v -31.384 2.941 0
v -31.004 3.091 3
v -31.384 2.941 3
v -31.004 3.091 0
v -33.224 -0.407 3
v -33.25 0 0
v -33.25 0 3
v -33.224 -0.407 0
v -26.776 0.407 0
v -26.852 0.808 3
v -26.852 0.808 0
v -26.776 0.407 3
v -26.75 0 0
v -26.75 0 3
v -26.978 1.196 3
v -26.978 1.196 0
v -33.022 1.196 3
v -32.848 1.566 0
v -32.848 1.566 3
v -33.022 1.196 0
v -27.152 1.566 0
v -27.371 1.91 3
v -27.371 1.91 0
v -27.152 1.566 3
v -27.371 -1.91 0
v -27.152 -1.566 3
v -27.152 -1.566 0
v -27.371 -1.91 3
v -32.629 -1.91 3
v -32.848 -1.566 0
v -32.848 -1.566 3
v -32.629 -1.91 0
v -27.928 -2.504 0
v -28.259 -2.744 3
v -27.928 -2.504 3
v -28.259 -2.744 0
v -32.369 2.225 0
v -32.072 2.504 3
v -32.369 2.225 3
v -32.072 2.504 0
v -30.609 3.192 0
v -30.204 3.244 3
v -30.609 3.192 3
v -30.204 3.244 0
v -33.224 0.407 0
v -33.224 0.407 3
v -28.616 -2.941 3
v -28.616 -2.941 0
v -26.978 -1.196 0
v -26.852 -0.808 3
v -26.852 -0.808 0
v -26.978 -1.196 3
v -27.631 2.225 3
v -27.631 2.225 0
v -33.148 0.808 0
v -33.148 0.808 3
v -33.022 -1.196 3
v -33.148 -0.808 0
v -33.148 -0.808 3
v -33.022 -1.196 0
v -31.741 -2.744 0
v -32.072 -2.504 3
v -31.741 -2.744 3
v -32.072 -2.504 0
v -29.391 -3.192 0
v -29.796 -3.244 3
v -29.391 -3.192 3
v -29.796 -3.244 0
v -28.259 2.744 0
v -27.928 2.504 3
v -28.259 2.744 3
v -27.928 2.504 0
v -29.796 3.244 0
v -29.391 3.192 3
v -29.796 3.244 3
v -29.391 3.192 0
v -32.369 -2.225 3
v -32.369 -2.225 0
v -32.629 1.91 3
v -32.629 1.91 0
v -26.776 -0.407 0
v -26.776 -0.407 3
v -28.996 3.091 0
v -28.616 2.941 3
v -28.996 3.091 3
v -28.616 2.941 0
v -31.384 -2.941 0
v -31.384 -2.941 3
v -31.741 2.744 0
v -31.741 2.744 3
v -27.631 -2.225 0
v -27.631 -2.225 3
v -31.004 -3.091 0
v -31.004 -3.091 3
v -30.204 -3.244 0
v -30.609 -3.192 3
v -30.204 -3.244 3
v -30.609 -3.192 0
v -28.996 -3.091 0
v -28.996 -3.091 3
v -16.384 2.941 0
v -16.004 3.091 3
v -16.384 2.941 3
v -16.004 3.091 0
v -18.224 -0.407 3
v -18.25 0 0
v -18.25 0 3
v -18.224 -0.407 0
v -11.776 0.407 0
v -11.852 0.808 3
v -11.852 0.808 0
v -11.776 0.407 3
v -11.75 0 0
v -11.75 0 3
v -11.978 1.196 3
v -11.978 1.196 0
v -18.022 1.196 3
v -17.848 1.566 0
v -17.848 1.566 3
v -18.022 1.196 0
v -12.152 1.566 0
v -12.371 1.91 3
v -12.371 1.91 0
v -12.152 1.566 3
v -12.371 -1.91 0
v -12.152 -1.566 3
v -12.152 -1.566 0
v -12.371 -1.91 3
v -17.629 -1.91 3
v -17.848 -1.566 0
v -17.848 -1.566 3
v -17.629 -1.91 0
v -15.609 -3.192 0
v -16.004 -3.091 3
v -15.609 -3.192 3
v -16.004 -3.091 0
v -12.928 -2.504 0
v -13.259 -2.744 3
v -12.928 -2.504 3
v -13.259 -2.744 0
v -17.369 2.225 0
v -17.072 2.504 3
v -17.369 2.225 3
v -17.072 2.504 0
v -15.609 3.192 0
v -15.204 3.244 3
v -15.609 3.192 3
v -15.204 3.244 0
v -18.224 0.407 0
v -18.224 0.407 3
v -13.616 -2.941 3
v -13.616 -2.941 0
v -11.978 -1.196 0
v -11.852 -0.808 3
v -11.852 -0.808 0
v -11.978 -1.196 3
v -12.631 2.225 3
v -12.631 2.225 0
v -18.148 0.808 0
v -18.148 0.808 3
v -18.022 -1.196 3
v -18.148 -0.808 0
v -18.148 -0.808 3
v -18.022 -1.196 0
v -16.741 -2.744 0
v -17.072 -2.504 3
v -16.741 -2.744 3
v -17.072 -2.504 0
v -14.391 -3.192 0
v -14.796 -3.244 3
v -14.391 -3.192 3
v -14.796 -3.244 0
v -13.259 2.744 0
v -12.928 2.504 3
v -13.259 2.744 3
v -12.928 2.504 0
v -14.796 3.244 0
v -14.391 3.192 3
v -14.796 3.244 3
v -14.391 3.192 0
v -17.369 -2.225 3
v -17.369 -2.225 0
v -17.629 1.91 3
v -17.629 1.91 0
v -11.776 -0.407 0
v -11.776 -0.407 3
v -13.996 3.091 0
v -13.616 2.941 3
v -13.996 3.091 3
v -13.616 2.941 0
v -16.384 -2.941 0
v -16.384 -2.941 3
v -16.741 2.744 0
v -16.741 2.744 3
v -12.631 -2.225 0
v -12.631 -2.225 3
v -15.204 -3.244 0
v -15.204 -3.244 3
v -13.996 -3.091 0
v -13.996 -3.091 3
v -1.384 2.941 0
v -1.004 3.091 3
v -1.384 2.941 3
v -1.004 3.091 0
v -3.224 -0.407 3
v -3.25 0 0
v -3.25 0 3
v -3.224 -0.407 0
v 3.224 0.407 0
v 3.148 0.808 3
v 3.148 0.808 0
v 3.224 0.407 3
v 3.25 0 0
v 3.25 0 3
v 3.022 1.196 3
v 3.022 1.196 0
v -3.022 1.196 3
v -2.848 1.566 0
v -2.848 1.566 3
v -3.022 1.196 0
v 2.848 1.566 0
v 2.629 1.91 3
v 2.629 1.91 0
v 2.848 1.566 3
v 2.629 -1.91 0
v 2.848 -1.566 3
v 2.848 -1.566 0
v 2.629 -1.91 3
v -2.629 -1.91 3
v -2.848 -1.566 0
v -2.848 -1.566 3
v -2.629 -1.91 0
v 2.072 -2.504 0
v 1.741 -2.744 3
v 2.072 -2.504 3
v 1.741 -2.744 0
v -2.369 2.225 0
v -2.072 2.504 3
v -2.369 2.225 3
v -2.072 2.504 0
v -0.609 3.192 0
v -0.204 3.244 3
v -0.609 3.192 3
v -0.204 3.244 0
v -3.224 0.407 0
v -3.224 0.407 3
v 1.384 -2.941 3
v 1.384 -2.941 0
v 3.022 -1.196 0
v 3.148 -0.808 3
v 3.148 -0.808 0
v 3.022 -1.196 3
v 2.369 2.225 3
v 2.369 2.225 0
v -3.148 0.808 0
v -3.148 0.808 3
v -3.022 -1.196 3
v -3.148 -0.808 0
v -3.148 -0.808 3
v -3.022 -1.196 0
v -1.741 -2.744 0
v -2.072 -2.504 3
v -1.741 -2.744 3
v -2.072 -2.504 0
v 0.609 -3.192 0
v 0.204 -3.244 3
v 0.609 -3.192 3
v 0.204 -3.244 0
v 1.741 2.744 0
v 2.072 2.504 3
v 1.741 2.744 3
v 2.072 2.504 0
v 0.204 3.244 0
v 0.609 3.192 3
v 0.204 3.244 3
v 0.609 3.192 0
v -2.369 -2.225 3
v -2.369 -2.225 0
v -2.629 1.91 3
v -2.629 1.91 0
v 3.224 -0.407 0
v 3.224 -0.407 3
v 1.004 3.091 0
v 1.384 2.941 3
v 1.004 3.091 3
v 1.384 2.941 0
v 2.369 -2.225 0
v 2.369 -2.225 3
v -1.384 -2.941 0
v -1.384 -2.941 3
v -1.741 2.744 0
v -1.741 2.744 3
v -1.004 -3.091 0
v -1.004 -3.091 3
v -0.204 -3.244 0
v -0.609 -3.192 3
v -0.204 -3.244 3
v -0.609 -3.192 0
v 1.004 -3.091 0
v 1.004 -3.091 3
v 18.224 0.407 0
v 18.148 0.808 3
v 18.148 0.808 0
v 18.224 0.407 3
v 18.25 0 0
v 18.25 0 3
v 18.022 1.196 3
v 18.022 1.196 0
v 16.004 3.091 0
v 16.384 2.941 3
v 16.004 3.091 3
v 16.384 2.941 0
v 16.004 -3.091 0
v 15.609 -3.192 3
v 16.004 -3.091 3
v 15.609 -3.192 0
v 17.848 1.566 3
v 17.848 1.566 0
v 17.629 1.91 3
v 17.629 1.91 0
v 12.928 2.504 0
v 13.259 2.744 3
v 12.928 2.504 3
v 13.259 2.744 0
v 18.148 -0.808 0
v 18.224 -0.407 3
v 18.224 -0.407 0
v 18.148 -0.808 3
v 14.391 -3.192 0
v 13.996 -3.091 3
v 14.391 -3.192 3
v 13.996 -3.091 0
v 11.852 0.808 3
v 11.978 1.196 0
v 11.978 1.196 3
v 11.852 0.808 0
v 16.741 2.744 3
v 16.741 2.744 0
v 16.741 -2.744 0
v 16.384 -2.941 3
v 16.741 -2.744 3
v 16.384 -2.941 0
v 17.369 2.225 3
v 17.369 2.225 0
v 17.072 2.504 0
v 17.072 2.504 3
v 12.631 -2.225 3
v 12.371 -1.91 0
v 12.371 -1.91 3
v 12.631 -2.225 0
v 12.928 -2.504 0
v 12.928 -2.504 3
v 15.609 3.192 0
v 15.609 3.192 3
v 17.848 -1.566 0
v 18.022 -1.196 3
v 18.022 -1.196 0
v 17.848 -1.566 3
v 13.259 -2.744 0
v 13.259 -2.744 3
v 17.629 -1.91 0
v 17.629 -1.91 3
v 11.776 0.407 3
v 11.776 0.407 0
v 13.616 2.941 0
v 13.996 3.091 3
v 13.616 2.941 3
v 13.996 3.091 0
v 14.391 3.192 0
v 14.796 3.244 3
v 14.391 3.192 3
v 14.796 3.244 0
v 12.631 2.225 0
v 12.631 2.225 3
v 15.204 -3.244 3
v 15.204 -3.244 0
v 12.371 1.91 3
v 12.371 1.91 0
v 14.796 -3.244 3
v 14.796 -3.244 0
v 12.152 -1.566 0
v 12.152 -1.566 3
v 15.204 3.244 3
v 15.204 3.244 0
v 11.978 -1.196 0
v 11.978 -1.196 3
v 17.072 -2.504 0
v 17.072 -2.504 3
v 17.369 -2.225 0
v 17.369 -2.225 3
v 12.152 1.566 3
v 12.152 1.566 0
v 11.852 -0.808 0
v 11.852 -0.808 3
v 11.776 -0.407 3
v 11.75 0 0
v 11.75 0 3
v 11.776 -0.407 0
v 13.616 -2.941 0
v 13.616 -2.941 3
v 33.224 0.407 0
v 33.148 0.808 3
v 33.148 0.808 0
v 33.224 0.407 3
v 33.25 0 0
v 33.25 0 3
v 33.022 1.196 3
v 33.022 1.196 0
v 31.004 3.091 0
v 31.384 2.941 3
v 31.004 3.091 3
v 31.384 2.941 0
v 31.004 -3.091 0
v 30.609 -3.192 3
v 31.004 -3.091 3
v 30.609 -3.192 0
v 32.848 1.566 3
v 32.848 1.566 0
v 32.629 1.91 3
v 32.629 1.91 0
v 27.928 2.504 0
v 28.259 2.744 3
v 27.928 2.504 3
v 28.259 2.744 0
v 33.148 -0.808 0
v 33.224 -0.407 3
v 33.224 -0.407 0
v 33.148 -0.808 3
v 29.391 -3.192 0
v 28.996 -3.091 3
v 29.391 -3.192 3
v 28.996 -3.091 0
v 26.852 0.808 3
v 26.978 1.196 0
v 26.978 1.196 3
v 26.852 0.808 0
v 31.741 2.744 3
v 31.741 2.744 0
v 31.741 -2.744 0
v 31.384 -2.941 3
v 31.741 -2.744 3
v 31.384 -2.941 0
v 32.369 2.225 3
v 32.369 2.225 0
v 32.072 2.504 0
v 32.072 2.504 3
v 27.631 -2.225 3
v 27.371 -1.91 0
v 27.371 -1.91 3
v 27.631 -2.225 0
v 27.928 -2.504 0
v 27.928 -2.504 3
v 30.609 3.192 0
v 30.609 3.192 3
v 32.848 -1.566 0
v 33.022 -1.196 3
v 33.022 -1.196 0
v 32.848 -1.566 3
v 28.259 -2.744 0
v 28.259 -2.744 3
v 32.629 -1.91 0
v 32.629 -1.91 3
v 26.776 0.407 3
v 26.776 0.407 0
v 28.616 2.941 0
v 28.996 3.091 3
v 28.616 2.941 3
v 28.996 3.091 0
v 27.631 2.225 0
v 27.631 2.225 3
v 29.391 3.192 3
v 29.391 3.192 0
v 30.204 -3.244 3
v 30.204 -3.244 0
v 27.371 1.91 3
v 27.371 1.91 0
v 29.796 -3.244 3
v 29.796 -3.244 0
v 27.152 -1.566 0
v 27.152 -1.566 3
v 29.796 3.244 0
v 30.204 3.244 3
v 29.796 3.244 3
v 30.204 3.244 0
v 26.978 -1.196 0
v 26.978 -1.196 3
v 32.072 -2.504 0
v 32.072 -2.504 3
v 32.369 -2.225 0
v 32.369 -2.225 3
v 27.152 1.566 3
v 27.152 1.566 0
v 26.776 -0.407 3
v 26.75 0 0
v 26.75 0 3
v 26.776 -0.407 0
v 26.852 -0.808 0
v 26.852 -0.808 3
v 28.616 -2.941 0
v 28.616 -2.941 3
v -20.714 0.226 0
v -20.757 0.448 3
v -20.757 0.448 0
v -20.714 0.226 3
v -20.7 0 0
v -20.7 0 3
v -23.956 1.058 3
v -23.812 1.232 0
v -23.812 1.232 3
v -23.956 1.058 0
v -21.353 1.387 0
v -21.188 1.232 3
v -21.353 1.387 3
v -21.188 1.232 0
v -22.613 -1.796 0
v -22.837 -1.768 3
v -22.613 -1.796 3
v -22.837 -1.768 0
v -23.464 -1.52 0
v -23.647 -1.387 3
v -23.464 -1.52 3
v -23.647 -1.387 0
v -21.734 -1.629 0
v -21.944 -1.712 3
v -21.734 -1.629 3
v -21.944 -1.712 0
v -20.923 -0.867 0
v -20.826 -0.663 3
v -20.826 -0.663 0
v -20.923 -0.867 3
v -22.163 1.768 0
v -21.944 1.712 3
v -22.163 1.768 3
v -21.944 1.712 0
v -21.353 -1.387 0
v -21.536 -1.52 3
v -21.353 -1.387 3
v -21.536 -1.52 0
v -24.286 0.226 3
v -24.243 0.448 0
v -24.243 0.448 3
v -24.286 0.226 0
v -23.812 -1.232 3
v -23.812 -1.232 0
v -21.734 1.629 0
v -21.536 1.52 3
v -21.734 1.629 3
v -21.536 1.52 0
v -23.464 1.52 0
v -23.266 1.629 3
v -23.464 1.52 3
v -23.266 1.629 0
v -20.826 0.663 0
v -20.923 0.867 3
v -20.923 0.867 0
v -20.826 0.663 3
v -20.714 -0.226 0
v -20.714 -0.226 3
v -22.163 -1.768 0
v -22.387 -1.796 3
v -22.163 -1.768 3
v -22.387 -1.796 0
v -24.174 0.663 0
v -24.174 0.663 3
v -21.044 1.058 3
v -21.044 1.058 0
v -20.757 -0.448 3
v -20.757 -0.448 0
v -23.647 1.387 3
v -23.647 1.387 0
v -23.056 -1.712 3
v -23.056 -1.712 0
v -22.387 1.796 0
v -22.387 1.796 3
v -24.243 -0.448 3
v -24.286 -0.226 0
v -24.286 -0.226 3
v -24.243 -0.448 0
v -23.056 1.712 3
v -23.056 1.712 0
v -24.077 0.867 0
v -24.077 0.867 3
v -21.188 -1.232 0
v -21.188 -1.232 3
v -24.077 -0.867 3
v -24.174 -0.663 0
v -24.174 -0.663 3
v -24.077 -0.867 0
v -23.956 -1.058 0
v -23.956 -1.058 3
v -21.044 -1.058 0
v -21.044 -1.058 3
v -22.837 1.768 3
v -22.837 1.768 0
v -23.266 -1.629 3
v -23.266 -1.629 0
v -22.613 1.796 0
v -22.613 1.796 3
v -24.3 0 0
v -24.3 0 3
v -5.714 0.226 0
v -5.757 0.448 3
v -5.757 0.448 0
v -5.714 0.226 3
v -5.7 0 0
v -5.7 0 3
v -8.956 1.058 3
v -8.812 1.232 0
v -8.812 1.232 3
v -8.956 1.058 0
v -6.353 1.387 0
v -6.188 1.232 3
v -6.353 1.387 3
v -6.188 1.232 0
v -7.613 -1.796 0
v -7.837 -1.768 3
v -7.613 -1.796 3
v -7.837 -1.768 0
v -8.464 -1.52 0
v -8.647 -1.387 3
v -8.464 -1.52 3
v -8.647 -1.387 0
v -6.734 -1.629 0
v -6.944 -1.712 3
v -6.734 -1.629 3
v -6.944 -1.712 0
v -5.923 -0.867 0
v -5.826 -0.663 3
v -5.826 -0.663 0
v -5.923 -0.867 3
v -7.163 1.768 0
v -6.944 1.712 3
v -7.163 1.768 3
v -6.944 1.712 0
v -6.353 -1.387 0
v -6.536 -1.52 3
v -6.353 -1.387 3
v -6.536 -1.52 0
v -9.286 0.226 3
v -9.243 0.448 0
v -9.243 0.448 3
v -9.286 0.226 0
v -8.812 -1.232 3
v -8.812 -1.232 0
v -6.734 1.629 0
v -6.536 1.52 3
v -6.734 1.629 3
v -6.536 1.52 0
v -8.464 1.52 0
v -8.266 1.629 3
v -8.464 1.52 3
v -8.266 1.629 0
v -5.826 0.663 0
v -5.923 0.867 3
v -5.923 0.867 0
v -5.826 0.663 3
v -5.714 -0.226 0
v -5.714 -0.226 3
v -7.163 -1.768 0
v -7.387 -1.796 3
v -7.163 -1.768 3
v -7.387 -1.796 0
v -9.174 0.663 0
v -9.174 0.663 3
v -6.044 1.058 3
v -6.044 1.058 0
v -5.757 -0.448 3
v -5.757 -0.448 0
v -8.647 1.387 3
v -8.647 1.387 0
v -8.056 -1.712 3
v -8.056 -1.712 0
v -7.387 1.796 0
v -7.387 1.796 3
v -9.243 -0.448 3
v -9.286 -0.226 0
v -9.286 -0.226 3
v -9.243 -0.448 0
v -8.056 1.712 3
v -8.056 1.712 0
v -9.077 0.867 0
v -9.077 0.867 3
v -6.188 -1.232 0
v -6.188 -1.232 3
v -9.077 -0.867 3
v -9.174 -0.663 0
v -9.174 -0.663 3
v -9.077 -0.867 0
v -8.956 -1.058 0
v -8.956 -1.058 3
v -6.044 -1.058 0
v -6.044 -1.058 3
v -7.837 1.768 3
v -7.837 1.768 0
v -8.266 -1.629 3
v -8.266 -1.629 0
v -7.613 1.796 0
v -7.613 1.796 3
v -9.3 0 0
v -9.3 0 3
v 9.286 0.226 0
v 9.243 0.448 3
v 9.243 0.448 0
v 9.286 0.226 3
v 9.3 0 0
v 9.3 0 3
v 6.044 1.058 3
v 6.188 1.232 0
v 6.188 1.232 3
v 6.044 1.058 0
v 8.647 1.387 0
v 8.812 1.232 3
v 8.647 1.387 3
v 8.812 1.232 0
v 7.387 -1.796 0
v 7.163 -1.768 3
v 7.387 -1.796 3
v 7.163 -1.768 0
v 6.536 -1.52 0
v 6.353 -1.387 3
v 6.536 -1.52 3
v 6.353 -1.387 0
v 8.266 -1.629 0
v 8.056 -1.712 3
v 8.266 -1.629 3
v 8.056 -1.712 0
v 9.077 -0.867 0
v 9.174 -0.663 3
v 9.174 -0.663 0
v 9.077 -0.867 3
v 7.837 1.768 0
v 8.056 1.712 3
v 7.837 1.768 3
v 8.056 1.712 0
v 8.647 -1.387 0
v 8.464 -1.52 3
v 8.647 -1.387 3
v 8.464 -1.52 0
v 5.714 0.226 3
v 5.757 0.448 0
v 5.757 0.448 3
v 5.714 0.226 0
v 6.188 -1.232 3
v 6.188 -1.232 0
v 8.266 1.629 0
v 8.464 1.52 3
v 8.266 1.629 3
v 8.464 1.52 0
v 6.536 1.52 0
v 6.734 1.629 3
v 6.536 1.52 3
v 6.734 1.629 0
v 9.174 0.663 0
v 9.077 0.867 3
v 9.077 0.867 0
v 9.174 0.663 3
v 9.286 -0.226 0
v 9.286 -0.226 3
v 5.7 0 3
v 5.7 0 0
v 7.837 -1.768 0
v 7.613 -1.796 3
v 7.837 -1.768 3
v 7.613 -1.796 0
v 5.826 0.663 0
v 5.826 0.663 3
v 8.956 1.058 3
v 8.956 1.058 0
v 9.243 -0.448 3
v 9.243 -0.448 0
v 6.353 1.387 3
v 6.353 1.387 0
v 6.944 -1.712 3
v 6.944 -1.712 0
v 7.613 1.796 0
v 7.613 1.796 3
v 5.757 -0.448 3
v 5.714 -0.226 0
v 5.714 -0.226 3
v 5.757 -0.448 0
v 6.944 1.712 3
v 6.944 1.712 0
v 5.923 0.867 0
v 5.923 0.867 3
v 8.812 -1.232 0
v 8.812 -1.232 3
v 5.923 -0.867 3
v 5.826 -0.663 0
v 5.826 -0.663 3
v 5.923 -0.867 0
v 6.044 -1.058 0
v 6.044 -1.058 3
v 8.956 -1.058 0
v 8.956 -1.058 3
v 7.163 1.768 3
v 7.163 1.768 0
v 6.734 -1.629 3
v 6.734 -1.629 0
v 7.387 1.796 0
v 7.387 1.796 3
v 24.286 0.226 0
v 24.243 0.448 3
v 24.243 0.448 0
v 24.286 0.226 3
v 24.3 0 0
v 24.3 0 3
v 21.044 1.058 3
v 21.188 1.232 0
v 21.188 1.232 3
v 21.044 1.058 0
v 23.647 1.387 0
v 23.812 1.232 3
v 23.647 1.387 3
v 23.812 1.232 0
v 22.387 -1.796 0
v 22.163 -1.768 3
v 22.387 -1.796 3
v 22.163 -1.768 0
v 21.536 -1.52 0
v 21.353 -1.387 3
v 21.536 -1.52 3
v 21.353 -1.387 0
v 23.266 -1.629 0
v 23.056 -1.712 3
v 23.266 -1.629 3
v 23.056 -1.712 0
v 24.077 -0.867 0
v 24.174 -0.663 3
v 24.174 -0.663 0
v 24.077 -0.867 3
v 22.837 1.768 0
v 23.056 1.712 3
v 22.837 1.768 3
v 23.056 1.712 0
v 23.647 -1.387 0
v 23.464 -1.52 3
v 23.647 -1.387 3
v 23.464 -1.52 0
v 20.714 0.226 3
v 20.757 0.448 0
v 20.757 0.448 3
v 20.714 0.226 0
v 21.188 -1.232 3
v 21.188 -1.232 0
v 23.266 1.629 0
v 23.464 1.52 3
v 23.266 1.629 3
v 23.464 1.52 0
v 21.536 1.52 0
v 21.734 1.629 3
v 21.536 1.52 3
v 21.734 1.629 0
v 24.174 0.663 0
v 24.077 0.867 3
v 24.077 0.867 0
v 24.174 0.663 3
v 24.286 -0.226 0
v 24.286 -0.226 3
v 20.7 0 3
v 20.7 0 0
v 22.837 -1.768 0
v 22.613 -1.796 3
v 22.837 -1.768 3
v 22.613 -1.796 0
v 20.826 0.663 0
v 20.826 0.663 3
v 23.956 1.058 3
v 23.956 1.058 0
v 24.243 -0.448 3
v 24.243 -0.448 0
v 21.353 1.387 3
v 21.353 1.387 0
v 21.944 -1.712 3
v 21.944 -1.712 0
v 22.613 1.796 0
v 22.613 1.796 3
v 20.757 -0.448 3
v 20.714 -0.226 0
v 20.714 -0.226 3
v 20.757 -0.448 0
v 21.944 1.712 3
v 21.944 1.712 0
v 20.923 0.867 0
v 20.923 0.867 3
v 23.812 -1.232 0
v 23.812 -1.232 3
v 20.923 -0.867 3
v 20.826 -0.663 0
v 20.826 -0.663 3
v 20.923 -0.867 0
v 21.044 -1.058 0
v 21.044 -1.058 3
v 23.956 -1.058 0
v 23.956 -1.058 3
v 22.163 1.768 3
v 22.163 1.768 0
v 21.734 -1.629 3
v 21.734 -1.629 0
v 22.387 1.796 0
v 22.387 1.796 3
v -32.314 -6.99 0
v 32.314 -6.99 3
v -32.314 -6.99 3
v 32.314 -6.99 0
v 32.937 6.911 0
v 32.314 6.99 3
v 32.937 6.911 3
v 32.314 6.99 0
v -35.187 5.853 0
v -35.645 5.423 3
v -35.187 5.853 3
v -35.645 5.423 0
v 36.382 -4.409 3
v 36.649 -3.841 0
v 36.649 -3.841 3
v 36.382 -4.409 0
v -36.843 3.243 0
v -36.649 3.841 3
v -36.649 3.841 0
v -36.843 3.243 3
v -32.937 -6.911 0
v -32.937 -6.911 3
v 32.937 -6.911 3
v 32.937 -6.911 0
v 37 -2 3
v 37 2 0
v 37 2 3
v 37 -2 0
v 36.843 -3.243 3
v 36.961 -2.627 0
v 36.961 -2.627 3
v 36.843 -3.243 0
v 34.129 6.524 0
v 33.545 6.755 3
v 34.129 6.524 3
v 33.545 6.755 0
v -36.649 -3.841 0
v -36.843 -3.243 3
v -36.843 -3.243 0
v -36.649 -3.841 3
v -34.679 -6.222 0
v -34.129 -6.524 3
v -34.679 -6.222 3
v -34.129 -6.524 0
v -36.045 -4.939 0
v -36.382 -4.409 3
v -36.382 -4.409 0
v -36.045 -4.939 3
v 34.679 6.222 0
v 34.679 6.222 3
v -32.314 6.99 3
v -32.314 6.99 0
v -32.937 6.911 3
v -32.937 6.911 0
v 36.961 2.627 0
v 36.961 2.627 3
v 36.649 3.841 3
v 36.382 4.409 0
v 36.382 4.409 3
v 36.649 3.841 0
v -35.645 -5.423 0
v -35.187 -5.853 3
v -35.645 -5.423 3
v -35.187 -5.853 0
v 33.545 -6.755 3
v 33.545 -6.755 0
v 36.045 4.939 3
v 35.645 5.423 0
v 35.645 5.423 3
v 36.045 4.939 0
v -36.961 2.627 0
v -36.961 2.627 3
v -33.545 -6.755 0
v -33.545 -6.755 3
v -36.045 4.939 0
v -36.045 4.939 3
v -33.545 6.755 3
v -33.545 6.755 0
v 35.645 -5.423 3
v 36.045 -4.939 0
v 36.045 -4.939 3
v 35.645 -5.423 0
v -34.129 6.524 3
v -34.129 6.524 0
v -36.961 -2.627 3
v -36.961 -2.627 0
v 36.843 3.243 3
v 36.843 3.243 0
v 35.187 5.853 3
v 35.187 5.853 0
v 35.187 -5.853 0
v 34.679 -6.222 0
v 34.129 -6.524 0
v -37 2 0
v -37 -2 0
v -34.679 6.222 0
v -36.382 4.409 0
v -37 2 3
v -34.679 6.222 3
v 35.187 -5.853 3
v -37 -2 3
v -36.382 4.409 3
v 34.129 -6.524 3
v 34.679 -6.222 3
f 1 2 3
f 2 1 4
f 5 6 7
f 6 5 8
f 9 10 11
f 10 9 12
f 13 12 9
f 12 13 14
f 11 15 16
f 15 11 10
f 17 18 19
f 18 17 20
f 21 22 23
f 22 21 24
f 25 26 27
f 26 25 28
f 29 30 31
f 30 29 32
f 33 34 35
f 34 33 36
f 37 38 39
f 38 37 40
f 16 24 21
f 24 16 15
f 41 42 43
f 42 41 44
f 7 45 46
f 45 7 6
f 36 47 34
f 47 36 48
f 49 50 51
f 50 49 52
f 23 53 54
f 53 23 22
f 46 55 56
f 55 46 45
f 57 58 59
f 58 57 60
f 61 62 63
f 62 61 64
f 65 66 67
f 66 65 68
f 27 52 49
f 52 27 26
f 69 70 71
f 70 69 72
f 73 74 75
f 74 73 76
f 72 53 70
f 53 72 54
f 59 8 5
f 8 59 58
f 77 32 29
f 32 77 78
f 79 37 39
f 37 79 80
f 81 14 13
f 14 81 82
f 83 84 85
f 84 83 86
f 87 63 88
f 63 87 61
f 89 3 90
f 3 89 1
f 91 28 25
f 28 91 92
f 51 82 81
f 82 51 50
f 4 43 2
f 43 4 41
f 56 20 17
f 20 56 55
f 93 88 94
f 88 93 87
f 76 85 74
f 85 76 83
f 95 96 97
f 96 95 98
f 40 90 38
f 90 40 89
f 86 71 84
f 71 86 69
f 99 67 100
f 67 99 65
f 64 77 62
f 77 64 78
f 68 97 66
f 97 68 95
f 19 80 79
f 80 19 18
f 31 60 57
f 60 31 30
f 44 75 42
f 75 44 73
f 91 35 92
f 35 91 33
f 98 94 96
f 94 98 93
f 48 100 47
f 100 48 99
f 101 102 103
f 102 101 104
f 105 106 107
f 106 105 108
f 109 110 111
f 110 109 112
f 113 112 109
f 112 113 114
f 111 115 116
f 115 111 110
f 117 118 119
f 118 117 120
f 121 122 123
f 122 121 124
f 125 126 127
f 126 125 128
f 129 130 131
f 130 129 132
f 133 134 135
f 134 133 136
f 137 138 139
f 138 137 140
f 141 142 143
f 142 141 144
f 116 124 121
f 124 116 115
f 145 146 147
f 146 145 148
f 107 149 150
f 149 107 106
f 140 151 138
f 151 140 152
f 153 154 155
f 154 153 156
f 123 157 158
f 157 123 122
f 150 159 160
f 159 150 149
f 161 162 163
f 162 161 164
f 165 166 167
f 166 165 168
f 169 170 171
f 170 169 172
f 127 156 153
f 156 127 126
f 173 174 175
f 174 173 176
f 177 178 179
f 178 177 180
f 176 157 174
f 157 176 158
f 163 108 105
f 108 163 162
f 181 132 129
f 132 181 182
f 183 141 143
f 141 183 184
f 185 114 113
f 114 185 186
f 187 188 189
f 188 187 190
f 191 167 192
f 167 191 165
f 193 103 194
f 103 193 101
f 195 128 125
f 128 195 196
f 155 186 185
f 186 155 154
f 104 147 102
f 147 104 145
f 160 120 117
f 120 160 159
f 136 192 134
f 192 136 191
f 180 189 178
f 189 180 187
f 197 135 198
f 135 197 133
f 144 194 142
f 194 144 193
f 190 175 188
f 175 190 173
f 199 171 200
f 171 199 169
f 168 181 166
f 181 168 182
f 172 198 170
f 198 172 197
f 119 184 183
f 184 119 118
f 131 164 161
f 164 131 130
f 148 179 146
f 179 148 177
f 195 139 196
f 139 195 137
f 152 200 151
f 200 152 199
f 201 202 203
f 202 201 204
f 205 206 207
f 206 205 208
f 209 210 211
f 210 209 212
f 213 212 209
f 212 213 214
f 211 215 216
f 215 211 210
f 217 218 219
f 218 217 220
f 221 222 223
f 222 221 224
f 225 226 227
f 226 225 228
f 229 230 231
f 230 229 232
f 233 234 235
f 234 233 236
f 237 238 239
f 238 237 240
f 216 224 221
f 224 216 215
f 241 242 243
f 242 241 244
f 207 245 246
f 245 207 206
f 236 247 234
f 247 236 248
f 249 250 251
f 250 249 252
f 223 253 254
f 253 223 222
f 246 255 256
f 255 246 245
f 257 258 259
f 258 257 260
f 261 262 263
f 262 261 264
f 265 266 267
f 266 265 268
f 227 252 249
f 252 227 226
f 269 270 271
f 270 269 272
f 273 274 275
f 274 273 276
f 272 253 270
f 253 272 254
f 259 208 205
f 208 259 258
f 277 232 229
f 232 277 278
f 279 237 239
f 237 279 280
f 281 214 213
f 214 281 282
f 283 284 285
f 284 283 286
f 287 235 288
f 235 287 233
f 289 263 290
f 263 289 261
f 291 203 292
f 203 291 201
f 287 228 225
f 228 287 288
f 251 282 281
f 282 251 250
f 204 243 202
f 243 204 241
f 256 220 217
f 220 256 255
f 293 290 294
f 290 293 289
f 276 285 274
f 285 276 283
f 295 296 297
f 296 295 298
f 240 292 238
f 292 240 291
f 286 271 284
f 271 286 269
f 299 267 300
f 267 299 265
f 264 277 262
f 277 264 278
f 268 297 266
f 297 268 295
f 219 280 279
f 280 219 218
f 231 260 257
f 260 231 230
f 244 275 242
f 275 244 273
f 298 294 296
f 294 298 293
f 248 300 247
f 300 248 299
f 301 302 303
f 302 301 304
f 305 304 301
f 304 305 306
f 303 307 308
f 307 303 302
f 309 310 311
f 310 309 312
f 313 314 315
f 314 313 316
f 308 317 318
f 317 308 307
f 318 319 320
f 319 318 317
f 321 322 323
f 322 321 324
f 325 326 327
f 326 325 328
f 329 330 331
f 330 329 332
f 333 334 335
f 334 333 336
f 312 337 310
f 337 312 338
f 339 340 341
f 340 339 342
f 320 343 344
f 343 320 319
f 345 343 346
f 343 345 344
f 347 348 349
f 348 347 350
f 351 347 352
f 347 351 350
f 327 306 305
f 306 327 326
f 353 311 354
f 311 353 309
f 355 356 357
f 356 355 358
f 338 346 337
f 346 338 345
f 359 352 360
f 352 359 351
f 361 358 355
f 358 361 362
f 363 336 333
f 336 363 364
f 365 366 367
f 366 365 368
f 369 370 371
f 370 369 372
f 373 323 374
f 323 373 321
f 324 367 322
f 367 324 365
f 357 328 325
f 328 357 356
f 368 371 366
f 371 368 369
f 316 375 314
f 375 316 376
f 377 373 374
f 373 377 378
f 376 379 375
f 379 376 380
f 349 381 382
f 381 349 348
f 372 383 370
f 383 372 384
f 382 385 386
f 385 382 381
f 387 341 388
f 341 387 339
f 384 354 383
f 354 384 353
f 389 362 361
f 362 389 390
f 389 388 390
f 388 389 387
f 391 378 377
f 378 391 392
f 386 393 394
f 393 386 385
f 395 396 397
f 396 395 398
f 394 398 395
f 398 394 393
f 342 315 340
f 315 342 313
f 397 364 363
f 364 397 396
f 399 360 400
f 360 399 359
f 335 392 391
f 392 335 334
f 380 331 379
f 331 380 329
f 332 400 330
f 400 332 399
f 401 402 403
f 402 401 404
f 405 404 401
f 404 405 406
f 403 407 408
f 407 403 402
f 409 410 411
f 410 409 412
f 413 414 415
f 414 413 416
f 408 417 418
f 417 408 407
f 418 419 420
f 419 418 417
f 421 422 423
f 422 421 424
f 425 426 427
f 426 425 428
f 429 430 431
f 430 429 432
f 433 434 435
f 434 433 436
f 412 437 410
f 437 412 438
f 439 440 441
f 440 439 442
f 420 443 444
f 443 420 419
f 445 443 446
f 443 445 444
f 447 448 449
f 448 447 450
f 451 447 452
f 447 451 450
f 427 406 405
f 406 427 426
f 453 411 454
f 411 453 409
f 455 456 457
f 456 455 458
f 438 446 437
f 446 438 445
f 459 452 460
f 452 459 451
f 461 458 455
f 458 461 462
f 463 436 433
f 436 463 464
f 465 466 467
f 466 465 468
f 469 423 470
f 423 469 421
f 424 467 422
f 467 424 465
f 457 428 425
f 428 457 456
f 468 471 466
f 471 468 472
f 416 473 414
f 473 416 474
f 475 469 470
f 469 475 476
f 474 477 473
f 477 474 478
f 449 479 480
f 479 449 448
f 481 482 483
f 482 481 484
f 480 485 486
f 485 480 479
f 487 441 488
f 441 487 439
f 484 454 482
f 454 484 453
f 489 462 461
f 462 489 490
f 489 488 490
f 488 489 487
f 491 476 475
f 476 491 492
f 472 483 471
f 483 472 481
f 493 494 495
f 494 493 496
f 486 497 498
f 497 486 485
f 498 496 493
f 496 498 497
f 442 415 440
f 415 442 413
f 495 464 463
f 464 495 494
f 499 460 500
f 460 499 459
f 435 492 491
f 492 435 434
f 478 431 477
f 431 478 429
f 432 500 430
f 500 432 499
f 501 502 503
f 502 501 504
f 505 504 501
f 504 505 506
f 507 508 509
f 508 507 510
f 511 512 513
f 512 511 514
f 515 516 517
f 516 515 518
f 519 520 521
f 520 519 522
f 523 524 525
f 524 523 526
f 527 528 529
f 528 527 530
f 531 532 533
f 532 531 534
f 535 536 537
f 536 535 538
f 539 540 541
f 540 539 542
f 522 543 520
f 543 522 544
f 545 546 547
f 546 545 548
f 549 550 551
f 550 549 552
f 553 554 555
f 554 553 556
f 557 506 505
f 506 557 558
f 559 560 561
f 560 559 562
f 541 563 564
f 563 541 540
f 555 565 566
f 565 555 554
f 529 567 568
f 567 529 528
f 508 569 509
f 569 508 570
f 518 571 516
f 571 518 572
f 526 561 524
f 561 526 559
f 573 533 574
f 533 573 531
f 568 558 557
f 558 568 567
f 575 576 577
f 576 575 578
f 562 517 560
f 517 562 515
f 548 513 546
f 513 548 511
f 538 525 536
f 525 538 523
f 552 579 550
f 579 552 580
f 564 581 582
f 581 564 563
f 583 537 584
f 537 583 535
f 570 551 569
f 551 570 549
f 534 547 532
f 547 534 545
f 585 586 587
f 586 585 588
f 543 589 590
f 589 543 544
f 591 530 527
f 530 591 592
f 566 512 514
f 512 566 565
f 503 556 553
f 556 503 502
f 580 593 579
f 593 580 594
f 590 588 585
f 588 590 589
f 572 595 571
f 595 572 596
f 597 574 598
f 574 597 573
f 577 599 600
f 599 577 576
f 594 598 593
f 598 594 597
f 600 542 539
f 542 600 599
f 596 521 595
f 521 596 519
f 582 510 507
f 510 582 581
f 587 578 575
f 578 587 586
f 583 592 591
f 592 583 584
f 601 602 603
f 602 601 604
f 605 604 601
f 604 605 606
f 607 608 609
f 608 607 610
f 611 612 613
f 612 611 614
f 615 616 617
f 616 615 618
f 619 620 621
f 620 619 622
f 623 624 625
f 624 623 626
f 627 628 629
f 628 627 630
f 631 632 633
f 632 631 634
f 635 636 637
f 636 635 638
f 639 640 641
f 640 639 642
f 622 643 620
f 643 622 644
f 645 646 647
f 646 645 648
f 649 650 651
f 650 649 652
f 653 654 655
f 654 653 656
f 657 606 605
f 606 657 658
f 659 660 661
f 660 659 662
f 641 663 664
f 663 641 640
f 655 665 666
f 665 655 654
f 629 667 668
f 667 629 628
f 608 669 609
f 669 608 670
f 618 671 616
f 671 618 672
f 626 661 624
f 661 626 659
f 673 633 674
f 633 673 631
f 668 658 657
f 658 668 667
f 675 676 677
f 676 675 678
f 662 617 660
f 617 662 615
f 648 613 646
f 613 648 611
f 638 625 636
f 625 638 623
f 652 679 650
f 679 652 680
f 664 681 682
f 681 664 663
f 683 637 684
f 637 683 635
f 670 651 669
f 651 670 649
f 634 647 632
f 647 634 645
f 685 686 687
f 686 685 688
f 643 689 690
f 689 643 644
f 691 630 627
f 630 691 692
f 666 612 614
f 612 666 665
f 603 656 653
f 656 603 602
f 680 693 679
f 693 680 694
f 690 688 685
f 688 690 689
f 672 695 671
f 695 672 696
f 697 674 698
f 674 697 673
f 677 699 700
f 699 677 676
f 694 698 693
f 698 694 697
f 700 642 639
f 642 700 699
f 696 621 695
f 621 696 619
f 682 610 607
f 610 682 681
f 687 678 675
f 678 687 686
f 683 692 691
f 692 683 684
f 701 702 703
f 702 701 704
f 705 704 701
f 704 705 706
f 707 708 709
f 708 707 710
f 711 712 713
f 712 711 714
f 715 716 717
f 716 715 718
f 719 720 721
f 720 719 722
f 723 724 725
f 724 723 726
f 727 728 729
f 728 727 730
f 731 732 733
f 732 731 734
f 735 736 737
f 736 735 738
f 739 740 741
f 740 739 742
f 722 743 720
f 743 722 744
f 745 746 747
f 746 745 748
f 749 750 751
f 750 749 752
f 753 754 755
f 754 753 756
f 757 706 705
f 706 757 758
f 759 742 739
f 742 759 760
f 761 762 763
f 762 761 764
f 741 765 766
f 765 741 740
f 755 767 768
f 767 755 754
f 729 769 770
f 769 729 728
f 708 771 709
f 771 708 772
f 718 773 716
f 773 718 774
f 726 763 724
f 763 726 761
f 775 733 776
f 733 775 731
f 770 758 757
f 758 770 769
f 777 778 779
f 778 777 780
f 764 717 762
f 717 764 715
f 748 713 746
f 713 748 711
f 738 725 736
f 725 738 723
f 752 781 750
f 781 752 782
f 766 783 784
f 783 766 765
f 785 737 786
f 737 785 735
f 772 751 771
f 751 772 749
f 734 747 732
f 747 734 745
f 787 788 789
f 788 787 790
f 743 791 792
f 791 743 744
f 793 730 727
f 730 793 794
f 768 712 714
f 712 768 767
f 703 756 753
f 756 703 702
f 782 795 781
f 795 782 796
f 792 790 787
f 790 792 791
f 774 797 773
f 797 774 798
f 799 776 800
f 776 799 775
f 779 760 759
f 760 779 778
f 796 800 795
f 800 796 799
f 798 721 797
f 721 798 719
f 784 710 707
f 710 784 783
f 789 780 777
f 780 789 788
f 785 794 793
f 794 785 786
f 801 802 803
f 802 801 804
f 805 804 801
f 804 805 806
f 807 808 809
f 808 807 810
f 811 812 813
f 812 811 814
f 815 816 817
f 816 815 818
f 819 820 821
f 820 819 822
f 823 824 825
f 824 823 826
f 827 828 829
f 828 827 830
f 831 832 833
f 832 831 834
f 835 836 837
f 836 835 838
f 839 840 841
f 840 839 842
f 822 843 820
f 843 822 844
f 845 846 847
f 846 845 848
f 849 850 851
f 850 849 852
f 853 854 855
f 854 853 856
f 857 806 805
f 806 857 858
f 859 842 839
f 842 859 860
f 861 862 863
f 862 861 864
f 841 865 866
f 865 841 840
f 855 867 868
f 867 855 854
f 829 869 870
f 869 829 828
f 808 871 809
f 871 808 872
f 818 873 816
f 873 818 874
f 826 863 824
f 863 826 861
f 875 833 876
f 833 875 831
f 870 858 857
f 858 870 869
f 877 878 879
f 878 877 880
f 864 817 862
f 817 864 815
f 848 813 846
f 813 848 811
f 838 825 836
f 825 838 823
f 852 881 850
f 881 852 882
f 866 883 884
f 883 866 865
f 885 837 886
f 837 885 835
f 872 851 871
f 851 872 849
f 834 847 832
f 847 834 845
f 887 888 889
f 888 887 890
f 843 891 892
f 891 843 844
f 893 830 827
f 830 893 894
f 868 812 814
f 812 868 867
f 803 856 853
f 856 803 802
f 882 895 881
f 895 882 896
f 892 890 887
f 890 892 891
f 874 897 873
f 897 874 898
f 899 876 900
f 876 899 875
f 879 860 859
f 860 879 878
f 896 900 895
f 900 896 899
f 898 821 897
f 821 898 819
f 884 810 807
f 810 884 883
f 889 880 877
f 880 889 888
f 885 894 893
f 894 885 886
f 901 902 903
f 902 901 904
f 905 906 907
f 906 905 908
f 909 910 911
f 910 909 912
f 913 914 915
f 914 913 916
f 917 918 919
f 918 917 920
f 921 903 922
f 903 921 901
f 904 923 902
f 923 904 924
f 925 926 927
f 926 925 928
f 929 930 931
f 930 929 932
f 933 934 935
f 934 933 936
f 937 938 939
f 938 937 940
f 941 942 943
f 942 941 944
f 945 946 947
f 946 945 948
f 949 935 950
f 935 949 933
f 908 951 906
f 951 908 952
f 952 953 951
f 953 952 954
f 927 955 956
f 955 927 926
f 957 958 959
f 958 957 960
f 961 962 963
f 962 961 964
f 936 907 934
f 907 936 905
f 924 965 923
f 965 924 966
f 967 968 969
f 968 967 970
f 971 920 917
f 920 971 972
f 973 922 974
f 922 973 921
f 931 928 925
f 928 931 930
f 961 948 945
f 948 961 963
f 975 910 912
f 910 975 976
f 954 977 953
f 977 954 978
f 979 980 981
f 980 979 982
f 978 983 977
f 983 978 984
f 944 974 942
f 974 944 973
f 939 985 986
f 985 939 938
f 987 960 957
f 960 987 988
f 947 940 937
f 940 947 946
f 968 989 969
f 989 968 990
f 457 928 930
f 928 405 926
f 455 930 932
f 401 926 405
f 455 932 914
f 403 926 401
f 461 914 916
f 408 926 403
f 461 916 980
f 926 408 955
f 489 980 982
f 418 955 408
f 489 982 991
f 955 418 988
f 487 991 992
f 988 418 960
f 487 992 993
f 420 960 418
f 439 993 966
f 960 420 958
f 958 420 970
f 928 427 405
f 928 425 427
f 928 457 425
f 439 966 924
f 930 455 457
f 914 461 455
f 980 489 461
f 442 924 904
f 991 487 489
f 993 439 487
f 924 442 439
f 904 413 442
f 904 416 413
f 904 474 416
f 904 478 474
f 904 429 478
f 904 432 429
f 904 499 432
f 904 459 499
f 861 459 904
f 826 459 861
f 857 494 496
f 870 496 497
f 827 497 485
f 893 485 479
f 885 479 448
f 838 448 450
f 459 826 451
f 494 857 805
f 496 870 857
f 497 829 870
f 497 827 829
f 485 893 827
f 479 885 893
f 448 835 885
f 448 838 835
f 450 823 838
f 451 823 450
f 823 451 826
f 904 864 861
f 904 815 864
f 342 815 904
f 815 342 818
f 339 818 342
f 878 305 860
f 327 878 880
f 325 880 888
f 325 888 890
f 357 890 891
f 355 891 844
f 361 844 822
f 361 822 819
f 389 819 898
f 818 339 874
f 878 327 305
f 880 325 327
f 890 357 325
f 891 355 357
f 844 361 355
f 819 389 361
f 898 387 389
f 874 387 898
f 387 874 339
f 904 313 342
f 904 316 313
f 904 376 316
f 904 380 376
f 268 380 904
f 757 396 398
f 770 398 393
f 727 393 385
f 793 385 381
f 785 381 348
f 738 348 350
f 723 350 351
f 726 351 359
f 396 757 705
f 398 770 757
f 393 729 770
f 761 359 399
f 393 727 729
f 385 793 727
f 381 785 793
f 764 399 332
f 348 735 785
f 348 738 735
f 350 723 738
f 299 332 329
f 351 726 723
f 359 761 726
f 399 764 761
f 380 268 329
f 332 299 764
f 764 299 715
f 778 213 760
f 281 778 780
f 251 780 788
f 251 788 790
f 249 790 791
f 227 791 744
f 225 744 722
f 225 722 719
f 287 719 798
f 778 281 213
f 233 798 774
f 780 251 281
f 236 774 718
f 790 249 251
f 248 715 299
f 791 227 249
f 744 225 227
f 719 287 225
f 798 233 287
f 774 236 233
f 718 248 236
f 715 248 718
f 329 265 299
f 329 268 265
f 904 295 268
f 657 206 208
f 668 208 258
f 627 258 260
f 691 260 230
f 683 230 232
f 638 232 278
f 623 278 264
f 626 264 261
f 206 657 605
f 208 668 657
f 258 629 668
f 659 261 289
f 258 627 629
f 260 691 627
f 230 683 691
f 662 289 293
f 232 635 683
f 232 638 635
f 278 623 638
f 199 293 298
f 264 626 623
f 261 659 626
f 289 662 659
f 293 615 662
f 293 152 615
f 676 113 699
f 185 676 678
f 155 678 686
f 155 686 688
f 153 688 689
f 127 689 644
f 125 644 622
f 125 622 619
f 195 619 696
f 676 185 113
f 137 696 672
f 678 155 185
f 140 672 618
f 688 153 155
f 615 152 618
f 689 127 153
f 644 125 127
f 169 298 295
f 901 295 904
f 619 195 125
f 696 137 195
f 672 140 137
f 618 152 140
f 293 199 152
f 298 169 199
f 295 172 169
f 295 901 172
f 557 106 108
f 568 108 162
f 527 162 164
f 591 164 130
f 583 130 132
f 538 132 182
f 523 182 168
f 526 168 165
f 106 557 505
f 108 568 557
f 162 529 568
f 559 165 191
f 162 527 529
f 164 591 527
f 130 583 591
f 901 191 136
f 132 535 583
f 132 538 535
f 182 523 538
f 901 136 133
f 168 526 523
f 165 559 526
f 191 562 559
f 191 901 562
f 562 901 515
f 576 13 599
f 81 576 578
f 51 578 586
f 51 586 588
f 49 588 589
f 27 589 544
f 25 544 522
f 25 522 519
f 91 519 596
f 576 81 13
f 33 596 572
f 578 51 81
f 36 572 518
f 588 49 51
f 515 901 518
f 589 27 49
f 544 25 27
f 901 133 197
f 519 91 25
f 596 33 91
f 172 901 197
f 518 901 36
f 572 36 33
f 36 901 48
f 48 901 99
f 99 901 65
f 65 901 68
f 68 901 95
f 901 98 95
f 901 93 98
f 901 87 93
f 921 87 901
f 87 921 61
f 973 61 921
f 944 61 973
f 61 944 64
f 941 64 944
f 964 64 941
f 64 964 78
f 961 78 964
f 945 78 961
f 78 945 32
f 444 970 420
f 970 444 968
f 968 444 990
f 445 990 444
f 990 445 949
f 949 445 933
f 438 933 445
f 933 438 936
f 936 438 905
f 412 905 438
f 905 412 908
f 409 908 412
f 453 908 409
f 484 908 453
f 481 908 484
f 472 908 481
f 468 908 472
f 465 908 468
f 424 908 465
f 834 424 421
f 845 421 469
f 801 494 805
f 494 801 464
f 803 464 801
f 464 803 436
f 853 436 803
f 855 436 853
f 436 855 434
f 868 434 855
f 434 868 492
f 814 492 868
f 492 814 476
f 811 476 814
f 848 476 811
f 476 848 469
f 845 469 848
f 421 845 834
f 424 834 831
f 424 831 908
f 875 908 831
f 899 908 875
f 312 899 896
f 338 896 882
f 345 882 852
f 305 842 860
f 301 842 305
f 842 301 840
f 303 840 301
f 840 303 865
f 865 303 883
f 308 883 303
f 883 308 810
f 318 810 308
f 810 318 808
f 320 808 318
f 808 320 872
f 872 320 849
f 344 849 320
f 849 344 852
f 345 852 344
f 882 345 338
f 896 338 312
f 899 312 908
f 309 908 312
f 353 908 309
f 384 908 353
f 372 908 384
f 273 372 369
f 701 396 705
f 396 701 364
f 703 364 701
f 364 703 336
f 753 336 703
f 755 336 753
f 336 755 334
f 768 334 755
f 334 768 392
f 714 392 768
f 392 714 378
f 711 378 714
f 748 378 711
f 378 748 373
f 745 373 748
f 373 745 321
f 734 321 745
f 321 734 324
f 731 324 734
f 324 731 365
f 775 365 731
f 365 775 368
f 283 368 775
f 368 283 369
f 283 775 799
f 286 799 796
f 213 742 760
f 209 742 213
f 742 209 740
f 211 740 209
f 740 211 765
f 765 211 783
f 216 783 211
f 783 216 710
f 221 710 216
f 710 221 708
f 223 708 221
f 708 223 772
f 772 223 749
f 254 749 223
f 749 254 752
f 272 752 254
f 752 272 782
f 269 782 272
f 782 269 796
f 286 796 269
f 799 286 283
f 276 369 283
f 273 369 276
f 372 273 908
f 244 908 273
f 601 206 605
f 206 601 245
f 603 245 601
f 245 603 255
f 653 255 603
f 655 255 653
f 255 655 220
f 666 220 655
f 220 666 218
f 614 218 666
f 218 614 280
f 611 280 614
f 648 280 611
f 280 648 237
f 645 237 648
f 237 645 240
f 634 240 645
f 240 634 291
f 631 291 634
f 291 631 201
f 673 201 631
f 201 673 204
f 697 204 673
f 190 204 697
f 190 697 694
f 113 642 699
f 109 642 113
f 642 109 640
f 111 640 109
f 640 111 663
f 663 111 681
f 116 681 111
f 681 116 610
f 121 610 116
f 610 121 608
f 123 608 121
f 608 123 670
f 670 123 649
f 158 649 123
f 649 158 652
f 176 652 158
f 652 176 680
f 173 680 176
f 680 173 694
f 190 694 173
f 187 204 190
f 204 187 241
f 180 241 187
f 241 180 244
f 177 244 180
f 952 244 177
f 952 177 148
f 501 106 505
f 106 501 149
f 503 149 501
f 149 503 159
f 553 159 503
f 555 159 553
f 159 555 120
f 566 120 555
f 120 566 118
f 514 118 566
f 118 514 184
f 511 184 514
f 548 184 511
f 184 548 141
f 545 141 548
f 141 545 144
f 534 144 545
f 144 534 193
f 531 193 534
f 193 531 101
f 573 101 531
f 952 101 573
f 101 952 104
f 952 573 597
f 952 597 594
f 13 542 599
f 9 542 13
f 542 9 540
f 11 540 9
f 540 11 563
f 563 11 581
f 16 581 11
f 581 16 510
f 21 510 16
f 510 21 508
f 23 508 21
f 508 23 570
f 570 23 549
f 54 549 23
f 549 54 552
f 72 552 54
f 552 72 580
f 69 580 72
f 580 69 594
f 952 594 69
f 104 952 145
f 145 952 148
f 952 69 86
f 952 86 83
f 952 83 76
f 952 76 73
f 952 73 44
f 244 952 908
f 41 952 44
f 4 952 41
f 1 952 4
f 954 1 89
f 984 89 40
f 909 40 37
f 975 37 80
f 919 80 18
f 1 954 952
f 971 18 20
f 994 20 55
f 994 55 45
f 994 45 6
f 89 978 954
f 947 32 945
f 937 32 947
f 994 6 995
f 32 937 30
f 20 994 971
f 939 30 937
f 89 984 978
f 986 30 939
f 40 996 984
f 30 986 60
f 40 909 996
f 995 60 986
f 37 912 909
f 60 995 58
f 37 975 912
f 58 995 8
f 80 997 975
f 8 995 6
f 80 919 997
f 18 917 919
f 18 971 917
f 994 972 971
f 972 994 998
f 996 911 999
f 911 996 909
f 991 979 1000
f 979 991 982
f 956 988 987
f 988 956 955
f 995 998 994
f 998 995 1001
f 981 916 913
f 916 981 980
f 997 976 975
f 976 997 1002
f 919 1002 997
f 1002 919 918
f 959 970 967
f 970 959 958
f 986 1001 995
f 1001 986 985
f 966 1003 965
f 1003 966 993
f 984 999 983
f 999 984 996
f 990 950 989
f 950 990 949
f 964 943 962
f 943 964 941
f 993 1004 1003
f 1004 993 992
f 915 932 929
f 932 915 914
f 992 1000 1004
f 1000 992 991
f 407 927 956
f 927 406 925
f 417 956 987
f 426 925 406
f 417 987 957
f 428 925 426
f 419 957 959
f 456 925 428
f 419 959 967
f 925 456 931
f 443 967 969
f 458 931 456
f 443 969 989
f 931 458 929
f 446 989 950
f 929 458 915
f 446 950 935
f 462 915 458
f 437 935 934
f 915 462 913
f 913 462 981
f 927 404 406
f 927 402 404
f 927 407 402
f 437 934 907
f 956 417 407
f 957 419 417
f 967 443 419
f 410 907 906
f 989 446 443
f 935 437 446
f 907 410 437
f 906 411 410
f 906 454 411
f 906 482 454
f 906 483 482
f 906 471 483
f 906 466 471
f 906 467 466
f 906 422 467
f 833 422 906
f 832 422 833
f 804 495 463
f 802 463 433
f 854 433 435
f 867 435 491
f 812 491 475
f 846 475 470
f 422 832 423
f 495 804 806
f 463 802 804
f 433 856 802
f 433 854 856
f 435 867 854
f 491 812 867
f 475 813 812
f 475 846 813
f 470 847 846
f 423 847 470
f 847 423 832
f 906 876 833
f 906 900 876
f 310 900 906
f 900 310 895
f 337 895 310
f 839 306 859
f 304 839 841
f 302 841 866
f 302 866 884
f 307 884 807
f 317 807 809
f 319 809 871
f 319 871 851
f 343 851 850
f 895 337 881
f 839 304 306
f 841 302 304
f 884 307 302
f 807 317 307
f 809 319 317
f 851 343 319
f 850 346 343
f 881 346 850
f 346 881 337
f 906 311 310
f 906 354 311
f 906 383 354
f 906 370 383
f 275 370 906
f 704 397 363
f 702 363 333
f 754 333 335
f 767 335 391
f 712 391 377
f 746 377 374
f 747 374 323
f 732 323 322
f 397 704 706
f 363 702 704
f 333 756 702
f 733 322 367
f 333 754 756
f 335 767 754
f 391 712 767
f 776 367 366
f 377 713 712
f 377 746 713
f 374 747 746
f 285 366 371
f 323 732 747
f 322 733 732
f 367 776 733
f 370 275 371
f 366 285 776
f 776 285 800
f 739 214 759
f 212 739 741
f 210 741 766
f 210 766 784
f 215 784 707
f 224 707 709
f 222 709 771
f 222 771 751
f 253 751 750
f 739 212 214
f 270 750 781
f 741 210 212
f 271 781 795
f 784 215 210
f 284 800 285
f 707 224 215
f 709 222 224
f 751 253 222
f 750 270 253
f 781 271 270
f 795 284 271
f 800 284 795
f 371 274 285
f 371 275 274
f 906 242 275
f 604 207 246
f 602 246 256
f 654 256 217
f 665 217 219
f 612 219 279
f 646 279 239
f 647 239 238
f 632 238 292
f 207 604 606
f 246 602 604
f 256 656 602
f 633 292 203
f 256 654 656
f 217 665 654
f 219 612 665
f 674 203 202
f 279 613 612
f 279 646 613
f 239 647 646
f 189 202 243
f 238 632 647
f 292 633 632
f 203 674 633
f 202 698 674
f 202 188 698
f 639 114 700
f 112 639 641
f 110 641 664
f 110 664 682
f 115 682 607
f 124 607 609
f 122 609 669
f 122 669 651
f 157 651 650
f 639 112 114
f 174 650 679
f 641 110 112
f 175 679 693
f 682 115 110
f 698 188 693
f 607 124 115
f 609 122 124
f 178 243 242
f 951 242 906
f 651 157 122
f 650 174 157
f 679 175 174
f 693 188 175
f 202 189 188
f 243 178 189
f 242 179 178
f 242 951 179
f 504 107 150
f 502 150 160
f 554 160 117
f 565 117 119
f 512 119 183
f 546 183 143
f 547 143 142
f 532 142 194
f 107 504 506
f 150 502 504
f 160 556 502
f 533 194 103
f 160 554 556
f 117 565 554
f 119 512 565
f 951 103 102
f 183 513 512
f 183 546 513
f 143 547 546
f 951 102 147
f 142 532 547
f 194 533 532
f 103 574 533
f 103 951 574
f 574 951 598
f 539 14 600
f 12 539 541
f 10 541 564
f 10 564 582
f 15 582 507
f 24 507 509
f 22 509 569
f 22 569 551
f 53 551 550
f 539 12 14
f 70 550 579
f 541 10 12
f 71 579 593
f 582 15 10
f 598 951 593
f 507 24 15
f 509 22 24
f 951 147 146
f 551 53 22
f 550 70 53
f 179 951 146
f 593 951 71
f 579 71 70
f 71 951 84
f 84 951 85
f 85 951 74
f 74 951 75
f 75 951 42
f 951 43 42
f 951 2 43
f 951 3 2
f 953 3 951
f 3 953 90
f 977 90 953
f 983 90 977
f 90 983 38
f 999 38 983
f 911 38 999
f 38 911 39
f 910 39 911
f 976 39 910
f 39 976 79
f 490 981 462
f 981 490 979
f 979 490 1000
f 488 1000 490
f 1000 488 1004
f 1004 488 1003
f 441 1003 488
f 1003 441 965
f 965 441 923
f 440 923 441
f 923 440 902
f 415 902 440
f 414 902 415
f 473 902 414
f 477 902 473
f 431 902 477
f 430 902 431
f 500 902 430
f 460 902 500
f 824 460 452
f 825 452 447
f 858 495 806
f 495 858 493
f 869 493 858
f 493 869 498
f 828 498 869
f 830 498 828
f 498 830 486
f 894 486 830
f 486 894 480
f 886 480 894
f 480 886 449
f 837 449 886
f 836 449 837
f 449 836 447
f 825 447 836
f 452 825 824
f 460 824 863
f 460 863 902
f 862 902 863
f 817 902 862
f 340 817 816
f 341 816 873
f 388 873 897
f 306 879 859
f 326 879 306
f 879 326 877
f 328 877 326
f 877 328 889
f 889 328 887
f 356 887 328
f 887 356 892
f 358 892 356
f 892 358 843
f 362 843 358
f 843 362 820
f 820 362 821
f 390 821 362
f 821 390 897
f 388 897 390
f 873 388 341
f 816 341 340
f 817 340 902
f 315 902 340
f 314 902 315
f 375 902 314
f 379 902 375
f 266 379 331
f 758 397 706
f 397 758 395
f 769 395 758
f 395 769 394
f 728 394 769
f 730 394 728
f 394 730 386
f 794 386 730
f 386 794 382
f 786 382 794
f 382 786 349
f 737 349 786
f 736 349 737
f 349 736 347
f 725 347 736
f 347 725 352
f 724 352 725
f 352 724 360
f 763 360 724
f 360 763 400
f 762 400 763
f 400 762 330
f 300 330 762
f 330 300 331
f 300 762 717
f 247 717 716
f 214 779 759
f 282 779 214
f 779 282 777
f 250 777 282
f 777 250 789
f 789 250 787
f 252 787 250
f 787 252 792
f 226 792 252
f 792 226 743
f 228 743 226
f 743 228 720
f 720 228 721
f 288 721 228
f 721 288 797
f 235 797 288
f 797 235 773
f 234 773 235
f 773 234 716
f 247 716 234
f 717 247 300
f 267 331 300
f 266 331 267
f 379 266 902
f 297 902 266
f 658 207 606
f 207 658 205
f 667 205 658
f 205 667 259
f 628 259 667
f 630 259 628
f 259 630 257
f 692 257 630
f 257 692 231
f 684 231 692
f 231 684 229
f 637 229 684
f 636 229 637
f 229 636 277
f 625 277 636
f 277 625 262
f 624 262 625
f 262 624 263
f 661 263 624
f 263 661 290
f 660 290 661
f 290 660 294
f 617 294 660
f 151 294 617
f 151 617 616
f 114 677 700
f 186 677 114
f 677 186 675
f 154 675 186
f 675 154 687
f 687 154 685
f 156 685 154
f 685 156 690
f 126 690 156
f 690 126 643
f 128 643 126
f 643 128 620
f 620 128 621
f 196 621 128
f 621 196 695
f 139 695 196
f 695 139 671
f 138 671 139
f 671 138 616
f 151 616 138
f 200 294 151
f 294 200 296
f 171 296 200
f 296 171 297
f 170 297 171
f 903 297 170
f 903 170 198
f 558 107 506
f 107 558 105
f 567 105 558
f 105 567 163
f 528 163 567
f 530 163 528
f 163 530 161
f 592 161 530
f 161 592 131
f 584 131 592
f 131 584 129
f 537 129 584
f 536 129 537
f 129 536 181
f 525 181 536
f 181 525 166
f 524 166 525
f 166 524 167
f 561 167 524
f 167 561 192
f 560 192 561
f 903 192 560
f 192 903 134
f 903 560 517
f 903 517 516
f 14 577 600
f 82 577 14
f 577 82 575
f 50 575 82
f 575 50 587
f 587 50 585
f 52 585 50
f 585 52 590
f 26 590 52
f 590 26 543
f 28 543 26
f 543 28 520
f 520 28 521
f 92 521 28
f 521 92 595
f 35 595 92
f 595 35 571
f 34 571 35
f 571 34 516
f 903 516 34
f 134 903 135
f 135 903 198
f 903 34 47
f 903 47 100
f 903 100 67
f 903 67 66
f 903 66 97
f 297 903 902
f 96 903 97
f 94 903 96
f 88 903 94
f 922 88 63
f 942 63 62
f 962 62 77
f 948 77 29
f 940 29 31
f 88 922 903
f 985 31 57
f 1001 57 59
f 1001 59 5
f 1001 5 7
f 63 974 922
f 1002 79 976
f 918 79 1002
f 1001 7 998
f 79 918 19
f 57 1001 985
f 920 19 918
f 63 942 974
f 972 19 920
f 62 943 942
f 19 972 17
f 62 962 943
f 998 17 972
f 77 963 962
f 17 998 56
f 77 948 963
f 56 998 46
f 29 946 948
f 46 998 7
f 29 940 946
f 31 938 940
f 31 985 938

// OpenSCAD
$fn = 50;


difference() {
	union() {
		*color(alpha = 1.0000000000, c = "gray") {
			translate(v = [0, 7, 0]) {
				linear_extrude(height = 1) {
					text(font = "Arial:style=Bold", halign = "center", size = 4.5000000000, text = "COMMENT plate main", valign = "center");
				}
			}
		}
		*color(alpha = 1.0000000000, c = "gray") {
			translate(v = [0, 14, 0]) {
				linear_extrude(height = 1) {
					text(font = "Arial:style=Bold", halign = "center", size = 4.5000000000, text = "COMMENT description oobb_plate_shape_p_type_3_depth_5_width_1_height_3_thickness_true_both_holes", valign = "center");
				}
			}
		}
		hull() {
			translate(v = [-32.0000000000, 2.0000000000, 0]) {
				cylinder(h = 3, r = 5);
			}
			translate(v = [32.0000000000, 2.0000000000, 0]) {
				cylinder(h = 3, r = 5);
			}
			translate(v = [-32.0000000000, -2.0000000000, 0]) {
				cylinder(h = 3, r = 5);
			}
			translate(v = [32.0000000000, -2.0000000000, 0]) {
				cylinder(h = 3, r = 5);
			}
		}
	}
	union() {
		*color(alpha = 1.0000000000, c = "gray") {
			translate(v = [0, 7, 0]) {
				linear_extrude(height = 1) {
					text(font = "Arial:style=Bold", halign = "center", size = 4.5000000000, text = "COMMENT holes main", valign = "center");
				}
			}
		}
		*color(alpha = 1.0000000000, c = "gray") {
			translate(v = [0, 14, 0]) {
				linear_extrude(height = 1) {
					text(font = "Arial:style=Bold", halign = "center", size = 4.5000000000, text = "COMMENT description oobb_holes_shape_n_type_5_width_1_height_3_thickness_true_both_holes", valign = "center");
				}
			}
		}
		translate(v = [-30.0000000000, 0.0000000000, 0]) {
			translate(v = [0, 0, -50]) {
				cylinder(h = 100, r = 3.2500000000);
			}
		}
		translate(v = [-15.0000000000, 0.0000000000, 0]) {
			translate(v = [0, 0, -50]) {
				cylinder(h = 100, r = 3.2500000000);
			}
		}
		translate(v = [0, 0, -50]) {
			cylinder(h = 100, r = 3.2500000000);
		}
		translate(v = [15.0000000000, 0.0000000000, 0]) {
			translate(v = [0, 0, -50]) {
				cylinder(h = 100, r = 3.2500000000);
			}
		}
		translate(v = [30.0000000000, 0.0000000000, 0]) {
			translate(v = [0, 0, -50]) {
				cylinder(h = 100, r = 3.2500000000);
			}
		}
		translate(v = [-30.0000000000, 0.0000000000, 0]) {
			translate(v = [0, 0, -50]) {
				cylinder(h = 100, r = 1.8000000000);
			}
		}
		translate(v = [-22.5000000000, 0.0000000000, 0]) {
			translate(v = [0, 0, -50]) {
				cylinder(h = 100, r = 1.8000000000);
			}
		}
		translate(v = [-15.0000000000, 0.0000000000, 0]) {
			translate(v = [0, 0, -50]) {
				cylinder(h = 100, r = 1.8000000000);
			}
		}
		translate(v = [-7.5000000000, 0.0000000000, 0]) {
			translate(v = [0, 0, -50]) {
				cylinder(h = 100, r = 1.8000000000);
			}
		}
		translate(v = [0, 0, -50]) {
			cylinder(h = 100, r = 1.8000000000);
		}
		translate(v = [7.5000000000, 0.0000000000, 0]) {
			translate(v = [0, 0, -50]) {
				cylinder(h = 100, r = 1.8000000000);
			}
		}
		translate(v = [15.0000000000, 0.0000000000, 0]) {
			translate(v = [0, 0, -50]) {
				cylinder(h = 100, r = 1.8000000000);
			}
		}
		translate(v = [22.5000000000, 0.0000000000, 0]) {
			translate(v = [0, 0, -50]) {
				cylinder(h = 100, r = 1.8000000000);
			}
		}
		translate(v = [30.0000000000, 0.0000000000, 0]) {
			translate(v = [0, 0, -50]) {
				cylinder(h = 100, r = 1.8000000000);
			}
		}
	}
}
